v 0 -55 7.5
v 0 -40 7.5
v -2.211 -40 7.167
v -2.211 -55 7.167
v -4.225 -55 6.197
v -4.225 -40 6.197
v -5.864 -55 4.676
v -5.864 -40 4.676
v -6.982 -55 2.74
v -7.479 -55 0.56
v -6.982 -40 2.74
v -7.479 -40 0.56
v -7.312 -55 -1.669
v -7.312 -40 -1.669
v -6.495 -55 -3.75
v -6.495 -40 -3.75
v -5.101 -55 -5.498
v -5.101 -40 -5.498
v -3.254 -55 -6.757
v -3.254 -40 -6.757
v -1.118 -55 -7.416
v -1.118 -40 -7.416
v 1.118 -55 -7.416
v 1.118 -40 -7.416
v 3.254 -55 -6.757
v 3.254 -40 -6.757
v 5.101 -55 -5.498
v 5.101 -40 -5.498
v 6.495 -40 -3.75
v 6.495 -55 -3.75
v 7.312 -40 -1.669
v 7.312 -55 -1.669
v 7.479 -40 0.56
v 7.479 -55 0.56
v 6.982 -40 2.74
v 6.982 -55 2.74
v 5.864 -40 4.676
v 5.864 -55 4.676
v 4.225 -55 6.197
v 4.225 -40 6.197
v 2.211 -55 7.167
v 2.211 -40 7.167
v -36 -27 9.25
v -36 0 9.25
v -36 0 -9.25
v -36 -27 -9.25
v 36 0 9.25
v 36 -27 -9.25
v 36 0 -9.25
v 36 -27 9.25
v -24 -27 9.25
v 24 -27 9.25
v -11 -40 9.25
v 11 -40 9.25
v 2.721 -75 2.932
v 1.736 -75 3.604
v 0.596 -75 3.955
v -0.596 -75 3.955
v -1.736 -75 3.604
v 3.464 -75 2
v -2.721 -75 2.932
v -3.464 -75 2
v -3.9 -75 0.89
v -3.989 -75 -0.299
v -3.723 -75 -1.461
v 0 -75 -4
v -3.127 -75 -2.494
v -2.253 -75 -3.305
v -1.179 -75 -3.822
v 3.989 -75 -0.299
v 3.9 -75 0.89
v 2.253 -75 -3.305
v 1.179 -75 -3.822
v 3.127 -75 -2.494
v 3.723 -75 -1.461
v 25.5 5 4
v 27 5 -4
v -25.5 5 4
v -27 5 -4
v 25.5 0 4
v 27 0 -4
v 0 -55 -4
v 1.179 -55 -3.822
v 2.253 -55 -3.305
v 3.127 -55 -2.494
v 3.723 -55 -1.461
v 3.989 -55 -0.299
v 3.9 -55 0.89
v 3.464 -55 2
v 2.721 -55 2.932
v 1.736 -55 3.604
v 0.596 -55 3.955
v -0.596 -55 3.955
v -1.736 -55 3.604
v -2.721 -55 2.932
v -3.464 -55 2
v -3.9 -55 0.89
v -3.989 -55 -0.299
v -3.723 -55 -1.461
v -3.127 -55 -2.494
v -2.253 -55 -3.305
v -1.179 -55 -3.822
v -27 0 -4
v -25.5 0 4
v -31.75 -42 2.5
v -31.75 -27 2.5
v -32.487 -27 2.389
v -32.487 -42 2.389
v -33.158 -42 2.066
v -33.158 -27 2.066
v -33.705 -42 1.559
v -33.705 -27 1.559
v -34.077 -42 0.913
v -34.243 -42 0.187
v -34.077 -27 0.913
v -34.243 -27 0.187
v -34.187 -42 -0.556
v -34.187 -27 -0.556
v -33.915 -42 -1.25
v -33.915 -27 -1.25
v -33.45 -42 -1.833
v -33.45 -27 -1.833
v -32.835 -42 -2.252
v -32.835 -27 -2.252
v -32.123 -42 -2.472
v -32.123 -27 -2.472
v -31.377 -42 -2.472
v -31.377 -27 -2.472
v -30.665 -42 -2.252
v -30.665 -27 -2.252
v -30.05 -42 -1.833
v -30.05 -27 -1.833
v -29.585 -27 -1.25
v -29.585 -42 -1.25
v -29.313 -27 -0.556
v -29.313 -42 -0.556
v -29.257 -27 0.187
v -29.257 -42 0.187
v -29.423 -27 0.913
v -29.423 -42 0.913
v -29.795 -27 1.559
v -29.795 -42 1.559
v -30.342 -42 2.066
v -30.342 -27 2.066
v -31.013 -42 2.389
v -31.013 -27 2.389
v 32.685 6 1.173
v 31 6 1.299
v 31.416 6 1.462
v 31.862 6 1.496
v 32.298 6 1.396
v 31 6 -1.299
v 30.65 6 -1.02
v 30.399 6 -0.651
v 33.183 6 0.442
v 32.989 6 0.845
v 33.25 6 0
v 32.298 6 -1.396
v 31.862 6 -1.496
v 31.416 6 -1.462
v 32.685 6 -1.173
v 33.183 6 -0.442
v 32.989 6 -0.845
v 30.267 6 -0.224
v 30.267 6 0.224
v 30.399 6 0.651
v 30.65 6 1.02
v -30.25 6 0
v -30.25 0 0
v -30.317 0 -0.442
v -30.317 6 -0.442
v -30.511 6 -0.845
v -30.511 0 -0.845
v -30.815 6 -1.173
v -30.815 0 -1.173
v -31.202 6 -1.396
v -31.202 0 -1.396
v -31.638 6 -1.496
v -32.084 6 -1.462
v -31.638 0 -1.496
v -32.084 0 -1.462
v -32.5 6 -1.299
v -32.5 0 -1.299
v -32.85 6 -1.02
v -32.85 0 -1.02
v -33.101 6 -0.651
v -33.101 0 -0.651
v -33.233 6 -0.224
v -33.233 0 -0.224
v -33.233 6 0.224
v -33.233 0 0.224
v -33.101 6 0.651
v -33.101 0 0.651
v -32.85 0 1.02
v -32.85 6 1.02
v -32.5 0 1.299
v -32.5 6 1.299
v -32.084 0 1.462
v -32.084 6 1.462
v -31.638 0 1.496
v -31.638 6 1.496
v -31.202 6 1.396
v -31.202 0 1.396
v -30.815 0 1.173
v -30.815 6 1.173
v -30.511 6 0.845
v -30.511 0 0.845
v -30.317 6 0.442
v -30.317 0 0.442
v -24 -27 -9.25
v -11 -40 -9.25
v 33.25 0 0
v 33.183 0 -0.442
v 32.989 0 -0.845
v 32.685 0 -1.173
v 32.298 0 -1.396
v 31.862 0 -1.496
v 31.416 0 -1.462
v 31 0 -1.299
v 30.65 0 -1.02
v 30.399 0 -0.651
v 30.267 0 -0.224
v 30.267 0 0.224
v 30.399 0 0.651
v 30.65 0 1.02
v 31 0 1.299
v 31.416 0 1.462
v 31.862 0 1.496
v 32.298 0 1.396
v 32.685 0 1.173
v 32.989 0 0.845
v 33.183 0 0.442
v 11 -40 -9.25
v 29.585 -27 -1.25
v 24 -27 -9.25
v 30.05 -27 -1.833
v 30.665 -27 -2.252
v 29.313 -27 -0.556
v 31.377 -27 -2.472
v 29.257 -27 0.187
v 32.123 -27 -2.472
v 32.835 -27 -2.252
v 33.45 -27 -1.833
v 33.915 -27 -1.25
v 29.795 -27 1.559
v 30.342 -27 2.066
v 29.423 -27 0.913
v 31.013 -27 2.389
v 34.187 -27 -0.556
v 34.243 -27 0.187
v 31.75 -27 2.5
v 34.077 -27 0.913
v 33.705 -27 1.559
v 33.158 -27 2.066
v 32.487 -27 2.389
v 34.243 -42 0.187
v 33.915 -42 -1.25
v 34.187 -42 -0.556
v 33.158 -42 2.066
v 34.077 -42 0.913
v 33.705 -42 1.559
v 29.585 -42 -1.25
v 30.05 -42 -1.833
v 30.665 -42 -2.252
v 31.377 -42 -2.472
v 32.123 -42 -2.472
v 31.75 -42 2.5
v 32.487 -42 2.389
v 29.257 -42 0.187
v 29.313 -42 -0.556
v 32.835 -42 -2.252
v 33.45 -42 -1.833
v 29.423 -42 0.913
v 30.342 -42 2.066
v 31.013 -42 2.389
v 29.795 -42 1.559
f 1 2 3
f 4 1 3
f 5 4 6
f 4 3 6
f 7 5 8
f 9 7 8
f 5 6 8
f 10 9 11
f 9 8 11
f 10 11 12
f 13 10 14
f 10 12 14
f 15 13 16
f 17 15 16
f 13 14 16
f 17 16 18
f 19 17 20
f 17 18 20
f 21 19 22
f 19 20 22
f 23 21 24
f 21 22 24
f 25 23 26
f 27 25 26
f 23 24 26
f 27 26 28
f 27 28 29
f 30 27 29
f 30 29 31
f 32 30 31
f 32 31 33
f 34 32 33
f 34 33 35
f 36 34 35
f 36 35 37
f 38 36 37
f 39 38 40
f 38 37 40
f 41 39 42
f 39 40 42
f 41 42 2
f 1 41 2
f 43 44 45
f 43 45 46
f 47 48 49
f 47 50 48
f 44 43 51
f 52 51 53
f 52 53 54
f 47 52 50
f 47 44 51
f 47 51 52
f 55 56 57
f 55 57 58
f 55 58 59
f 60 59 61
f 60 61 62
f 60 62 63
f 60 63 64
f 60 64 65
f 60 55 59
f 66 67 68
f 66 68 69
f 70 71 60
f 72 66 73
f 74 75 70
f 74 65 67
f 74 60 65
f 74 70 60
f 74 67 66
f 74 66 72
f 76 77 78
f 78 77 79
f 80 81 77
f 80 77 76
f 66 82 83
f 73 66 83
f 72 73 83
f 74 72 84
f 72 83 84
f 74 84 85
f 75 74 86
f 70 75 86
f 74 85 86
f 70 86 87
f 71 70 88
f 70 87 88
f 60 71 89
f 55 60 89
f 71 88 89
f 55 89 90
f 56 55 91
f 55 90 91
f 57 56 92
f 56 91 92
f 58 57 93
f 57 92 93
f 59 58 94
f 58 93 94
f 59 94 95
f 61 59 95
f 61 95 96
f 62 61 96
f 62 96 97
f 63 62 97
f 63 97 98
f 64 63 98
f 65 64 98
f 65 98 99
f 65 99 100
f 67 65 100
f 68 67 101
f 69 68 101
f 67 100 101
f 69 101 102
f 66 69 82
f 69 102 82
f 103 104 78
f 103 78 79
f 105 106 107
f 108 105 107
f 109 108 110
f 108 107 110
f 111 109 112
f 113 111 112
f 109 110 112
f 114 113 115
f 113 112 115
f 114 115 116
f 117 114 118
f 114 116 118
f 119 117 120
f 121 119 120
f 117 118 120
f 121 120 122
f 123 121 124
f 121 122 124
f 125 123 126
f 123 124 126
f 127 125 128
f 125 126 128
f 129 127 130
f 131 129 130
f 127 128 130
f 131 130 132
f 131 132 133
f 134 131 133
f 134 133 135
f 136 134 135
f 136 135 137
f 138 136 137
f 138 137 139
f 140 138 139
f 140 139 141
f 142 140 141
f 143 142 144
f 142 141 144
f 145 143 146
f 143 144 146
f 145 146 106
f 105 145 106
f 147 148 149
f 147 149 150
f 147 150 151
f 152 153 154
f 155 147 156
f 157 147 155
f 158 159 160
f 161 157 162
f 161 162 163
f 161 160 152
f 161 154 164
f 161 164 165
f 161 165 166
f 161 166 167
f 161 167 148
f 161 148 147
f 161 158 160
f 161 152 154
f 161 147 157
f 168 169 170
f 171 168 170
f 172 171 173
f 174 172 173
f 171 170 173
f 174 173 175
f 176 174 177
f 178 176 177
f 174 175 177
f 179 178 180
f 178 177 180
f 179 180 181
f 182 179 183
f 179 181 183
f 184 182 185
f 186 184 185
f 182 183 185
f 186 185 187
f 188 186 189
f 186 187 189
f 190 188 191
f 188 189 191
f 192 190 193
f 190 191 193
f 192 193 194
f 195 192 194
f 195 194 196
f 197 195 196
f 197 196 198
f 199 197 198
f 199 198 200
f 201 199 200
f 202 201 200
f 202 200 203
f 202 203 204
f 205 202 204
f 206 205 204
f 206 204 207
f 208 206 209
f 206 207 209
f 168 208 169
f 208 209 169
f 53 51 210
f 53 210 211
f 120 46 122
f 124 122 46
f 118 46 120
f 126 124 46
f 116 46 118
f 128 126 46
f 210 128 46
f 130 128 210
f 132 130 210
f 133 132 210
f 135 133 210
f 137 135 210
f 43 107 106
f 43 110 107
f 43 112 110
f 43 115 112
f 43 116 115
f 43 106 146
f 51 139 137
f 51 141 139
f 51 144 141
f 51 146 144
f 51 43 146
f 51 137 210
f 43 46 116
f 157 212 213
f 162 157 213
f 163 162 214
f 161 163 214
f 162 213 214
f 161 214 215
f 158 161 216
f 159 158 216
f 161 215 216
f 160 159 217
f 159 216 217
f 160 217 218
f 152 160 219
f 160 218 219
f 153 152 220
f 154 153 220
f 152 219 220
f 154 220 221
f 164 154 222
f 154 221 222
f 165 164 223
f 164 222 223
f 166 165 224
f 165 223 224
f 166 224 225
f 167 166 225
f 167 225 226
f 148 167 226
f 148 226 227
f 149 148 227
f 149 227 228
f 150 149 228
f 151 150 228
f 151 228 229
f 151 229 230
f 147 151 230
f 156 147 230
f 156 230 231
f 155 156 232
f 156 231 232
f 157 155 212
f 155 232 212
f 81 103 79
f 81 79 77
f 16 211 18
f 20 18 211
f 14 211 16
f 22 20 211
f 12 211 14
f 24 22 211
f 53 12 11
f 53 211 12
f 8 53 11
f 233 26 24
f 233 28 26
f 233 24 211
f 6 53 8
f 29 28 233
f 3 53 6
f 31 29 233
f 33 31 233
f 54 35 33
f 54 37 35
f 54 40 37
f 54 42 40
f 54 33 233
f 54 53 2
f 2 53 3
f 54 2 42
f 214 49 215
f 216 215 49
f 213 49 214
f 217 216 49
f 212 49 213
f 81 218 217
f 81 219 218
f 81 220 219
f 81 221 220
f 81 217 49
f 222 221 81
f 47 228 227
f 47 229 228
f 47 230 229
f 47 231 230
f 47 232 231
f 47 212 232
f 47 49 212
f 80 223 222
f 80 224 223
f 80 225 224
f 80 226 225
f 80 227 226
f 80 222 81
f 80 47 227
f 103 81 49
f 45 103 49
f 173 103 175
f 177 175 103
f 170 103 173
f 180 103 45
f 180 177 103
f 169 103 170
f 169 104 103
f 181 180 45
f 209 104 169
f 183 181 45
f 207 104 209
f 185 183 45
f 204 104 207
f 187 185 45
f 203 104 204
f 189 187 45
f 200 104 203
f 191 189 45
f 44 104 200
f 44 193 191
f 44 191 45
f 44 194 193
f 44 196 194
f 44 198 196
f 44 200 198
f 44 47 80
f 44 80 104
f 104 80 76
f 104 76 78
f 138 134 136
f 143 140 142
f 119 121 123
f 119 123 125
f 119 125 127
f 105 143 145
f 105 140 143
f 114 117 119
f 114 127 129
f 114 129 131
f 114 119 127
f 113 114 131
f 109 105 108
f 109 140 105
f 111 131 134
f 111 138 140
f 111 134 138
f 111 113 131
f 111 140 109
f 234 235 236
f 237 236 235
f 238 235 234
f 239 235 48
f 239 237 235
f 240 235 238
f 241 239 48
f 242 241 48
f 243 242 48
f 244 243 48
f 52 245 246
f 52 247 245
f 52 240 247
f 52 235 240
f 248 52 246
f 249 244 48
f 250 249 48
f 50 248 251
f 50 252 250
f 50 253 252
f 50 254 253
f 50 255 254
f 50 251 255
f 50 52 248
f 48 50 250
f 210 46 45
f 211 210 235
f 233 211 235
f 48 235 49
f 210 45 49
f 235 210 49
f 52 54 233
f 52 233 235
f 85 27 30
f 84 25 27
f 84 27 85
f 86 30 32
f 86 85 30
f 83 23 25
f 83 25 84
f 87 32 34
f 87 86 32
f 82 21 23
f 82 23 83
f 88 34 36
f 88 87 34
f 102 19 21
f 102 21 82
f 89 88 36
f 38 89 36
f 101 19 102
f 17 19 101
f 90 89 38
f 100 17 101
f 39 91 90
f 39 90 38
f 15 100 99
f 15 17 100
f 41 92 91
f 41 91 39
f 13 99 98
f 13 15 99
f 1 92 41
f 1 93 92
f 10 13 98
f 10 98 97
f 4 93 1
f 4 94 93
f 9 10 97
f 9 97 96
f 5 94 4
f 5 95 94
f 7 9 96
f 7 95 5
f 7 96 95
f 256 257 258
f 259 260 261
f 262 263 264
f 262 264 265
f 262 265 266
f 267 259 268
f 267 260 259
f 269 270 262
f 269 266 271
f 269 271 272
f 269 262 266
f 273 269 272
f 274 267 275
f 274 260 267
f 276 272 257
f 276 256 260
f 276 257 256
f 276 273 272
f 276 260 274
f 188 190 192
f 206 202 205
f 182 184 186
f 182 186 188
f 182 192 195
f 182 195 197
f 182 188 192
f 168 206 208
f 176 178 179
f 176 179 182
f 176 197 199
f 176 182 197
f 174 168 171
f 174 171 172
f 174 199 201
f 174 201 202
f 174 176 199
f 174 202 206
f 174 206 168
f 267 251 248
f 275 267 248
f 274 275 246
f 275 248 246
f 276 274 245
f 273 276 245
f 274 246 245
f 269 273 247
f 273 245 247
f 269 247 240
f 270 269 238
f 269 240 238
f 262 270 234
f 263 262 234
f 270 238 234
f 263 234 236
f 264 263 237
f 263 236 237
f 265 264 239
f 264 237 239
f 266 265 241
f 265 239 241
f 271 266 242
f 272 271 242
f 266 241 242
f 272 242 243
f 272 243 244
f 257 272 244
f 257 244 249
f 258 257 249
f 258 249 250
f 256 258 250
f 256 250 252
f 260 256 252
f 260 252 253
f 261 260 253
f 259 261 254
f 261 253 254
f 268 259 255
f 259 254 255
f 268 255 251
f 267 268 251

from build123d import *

# Parameters (mm, degrees)
EXTRUDE_1_DEPTH = 9.25
SKETCH_2_R      = 7.5
EXTRUDE_2_DEPTH = 15
SKETCH_3_R      = 4
EXTRUDE_3_DEPTH = 20
SKETCH_4_R      = 2.5
EXTRUDE_4_DEPTH = 15
EXTRUDE_5_DEPTH = 5
SKETCH_6_R      = 1.5
EXTRUDE_6_DEPTH = 6


with BuildPart() as part:
    # 草图1 → 凸台-拉伸1 (new, symmetric)
    with BuildSketch(Plane.XY):
        Polygon((36, 0), (-36, 0), (-36, -27), (-24, -27), (-11, -40), (11, -40), (24, -27), (36, -27), align=None)
    extrude(amount=EXTRUDE_1_DEPTH, both=True)

    # 草图2 → 凸台-拉伸2 (add)
    with BuildSketch(Plane.XZ.offset(40)):
        with Locations(Location((0, 0, 0), (0, 0, 90))):
            Circle(SKETCH_2_R)
    extrude(amount=EXTRUDE_2_DEPTH)

    # 草图3 → 凸台-拉伸3 (add)
    with BuildSketch(Plane.XZ.offset(55)):
        with Locations(Location((0, 0, 0), (0, 0, 270))):
            Circle(SKETCH_3_R)
    extrude(amount=EXTRUDE_3_DEPTH)

    # 草图4 → 凸台-拉伸4 (add)
    with BuildSketch(Plane.XZ.offset(27)):
        with Locations(Location((-31.75, 0, 0), (0, 0, 90))):
            Circle(SKETCH_4_R)
        with Locations(Location((31.75, 0, 0), (0, 0, 90))):
            Circle(SKETCH_4_R)
    extrude(amount=EXTRUDE_4_DEPTH)

    # 草图5 → 凸台-拉伸5 (add)
    with BuildSketch(Plane(origin=(0, 0, 0), x_dir=(1, 0, 0), z_dir=(0, 1, 0))):
        Polygon((-27, 4), (27, 4), (25.5, -4), (-25.5, -4), align=None)
    extrude(amount=EXTRUDE_5_DEPTH)

    # 草图6 → 凸台-拉伸6 (add)
    with BuildSketch(Plane(origin=(0, 0, 0), x_dir=(1, 0, 0), z_dir=(0, 1, 0))):
        with Locations((-31.75, 0)):
            Circle(SKETCH_6_R)
        with Locations((31.75, 0)):
            Circle(SKETCH_6_R)
    extrude(amount=EXTRUDE_6_DEPTH)


solid = part.part
